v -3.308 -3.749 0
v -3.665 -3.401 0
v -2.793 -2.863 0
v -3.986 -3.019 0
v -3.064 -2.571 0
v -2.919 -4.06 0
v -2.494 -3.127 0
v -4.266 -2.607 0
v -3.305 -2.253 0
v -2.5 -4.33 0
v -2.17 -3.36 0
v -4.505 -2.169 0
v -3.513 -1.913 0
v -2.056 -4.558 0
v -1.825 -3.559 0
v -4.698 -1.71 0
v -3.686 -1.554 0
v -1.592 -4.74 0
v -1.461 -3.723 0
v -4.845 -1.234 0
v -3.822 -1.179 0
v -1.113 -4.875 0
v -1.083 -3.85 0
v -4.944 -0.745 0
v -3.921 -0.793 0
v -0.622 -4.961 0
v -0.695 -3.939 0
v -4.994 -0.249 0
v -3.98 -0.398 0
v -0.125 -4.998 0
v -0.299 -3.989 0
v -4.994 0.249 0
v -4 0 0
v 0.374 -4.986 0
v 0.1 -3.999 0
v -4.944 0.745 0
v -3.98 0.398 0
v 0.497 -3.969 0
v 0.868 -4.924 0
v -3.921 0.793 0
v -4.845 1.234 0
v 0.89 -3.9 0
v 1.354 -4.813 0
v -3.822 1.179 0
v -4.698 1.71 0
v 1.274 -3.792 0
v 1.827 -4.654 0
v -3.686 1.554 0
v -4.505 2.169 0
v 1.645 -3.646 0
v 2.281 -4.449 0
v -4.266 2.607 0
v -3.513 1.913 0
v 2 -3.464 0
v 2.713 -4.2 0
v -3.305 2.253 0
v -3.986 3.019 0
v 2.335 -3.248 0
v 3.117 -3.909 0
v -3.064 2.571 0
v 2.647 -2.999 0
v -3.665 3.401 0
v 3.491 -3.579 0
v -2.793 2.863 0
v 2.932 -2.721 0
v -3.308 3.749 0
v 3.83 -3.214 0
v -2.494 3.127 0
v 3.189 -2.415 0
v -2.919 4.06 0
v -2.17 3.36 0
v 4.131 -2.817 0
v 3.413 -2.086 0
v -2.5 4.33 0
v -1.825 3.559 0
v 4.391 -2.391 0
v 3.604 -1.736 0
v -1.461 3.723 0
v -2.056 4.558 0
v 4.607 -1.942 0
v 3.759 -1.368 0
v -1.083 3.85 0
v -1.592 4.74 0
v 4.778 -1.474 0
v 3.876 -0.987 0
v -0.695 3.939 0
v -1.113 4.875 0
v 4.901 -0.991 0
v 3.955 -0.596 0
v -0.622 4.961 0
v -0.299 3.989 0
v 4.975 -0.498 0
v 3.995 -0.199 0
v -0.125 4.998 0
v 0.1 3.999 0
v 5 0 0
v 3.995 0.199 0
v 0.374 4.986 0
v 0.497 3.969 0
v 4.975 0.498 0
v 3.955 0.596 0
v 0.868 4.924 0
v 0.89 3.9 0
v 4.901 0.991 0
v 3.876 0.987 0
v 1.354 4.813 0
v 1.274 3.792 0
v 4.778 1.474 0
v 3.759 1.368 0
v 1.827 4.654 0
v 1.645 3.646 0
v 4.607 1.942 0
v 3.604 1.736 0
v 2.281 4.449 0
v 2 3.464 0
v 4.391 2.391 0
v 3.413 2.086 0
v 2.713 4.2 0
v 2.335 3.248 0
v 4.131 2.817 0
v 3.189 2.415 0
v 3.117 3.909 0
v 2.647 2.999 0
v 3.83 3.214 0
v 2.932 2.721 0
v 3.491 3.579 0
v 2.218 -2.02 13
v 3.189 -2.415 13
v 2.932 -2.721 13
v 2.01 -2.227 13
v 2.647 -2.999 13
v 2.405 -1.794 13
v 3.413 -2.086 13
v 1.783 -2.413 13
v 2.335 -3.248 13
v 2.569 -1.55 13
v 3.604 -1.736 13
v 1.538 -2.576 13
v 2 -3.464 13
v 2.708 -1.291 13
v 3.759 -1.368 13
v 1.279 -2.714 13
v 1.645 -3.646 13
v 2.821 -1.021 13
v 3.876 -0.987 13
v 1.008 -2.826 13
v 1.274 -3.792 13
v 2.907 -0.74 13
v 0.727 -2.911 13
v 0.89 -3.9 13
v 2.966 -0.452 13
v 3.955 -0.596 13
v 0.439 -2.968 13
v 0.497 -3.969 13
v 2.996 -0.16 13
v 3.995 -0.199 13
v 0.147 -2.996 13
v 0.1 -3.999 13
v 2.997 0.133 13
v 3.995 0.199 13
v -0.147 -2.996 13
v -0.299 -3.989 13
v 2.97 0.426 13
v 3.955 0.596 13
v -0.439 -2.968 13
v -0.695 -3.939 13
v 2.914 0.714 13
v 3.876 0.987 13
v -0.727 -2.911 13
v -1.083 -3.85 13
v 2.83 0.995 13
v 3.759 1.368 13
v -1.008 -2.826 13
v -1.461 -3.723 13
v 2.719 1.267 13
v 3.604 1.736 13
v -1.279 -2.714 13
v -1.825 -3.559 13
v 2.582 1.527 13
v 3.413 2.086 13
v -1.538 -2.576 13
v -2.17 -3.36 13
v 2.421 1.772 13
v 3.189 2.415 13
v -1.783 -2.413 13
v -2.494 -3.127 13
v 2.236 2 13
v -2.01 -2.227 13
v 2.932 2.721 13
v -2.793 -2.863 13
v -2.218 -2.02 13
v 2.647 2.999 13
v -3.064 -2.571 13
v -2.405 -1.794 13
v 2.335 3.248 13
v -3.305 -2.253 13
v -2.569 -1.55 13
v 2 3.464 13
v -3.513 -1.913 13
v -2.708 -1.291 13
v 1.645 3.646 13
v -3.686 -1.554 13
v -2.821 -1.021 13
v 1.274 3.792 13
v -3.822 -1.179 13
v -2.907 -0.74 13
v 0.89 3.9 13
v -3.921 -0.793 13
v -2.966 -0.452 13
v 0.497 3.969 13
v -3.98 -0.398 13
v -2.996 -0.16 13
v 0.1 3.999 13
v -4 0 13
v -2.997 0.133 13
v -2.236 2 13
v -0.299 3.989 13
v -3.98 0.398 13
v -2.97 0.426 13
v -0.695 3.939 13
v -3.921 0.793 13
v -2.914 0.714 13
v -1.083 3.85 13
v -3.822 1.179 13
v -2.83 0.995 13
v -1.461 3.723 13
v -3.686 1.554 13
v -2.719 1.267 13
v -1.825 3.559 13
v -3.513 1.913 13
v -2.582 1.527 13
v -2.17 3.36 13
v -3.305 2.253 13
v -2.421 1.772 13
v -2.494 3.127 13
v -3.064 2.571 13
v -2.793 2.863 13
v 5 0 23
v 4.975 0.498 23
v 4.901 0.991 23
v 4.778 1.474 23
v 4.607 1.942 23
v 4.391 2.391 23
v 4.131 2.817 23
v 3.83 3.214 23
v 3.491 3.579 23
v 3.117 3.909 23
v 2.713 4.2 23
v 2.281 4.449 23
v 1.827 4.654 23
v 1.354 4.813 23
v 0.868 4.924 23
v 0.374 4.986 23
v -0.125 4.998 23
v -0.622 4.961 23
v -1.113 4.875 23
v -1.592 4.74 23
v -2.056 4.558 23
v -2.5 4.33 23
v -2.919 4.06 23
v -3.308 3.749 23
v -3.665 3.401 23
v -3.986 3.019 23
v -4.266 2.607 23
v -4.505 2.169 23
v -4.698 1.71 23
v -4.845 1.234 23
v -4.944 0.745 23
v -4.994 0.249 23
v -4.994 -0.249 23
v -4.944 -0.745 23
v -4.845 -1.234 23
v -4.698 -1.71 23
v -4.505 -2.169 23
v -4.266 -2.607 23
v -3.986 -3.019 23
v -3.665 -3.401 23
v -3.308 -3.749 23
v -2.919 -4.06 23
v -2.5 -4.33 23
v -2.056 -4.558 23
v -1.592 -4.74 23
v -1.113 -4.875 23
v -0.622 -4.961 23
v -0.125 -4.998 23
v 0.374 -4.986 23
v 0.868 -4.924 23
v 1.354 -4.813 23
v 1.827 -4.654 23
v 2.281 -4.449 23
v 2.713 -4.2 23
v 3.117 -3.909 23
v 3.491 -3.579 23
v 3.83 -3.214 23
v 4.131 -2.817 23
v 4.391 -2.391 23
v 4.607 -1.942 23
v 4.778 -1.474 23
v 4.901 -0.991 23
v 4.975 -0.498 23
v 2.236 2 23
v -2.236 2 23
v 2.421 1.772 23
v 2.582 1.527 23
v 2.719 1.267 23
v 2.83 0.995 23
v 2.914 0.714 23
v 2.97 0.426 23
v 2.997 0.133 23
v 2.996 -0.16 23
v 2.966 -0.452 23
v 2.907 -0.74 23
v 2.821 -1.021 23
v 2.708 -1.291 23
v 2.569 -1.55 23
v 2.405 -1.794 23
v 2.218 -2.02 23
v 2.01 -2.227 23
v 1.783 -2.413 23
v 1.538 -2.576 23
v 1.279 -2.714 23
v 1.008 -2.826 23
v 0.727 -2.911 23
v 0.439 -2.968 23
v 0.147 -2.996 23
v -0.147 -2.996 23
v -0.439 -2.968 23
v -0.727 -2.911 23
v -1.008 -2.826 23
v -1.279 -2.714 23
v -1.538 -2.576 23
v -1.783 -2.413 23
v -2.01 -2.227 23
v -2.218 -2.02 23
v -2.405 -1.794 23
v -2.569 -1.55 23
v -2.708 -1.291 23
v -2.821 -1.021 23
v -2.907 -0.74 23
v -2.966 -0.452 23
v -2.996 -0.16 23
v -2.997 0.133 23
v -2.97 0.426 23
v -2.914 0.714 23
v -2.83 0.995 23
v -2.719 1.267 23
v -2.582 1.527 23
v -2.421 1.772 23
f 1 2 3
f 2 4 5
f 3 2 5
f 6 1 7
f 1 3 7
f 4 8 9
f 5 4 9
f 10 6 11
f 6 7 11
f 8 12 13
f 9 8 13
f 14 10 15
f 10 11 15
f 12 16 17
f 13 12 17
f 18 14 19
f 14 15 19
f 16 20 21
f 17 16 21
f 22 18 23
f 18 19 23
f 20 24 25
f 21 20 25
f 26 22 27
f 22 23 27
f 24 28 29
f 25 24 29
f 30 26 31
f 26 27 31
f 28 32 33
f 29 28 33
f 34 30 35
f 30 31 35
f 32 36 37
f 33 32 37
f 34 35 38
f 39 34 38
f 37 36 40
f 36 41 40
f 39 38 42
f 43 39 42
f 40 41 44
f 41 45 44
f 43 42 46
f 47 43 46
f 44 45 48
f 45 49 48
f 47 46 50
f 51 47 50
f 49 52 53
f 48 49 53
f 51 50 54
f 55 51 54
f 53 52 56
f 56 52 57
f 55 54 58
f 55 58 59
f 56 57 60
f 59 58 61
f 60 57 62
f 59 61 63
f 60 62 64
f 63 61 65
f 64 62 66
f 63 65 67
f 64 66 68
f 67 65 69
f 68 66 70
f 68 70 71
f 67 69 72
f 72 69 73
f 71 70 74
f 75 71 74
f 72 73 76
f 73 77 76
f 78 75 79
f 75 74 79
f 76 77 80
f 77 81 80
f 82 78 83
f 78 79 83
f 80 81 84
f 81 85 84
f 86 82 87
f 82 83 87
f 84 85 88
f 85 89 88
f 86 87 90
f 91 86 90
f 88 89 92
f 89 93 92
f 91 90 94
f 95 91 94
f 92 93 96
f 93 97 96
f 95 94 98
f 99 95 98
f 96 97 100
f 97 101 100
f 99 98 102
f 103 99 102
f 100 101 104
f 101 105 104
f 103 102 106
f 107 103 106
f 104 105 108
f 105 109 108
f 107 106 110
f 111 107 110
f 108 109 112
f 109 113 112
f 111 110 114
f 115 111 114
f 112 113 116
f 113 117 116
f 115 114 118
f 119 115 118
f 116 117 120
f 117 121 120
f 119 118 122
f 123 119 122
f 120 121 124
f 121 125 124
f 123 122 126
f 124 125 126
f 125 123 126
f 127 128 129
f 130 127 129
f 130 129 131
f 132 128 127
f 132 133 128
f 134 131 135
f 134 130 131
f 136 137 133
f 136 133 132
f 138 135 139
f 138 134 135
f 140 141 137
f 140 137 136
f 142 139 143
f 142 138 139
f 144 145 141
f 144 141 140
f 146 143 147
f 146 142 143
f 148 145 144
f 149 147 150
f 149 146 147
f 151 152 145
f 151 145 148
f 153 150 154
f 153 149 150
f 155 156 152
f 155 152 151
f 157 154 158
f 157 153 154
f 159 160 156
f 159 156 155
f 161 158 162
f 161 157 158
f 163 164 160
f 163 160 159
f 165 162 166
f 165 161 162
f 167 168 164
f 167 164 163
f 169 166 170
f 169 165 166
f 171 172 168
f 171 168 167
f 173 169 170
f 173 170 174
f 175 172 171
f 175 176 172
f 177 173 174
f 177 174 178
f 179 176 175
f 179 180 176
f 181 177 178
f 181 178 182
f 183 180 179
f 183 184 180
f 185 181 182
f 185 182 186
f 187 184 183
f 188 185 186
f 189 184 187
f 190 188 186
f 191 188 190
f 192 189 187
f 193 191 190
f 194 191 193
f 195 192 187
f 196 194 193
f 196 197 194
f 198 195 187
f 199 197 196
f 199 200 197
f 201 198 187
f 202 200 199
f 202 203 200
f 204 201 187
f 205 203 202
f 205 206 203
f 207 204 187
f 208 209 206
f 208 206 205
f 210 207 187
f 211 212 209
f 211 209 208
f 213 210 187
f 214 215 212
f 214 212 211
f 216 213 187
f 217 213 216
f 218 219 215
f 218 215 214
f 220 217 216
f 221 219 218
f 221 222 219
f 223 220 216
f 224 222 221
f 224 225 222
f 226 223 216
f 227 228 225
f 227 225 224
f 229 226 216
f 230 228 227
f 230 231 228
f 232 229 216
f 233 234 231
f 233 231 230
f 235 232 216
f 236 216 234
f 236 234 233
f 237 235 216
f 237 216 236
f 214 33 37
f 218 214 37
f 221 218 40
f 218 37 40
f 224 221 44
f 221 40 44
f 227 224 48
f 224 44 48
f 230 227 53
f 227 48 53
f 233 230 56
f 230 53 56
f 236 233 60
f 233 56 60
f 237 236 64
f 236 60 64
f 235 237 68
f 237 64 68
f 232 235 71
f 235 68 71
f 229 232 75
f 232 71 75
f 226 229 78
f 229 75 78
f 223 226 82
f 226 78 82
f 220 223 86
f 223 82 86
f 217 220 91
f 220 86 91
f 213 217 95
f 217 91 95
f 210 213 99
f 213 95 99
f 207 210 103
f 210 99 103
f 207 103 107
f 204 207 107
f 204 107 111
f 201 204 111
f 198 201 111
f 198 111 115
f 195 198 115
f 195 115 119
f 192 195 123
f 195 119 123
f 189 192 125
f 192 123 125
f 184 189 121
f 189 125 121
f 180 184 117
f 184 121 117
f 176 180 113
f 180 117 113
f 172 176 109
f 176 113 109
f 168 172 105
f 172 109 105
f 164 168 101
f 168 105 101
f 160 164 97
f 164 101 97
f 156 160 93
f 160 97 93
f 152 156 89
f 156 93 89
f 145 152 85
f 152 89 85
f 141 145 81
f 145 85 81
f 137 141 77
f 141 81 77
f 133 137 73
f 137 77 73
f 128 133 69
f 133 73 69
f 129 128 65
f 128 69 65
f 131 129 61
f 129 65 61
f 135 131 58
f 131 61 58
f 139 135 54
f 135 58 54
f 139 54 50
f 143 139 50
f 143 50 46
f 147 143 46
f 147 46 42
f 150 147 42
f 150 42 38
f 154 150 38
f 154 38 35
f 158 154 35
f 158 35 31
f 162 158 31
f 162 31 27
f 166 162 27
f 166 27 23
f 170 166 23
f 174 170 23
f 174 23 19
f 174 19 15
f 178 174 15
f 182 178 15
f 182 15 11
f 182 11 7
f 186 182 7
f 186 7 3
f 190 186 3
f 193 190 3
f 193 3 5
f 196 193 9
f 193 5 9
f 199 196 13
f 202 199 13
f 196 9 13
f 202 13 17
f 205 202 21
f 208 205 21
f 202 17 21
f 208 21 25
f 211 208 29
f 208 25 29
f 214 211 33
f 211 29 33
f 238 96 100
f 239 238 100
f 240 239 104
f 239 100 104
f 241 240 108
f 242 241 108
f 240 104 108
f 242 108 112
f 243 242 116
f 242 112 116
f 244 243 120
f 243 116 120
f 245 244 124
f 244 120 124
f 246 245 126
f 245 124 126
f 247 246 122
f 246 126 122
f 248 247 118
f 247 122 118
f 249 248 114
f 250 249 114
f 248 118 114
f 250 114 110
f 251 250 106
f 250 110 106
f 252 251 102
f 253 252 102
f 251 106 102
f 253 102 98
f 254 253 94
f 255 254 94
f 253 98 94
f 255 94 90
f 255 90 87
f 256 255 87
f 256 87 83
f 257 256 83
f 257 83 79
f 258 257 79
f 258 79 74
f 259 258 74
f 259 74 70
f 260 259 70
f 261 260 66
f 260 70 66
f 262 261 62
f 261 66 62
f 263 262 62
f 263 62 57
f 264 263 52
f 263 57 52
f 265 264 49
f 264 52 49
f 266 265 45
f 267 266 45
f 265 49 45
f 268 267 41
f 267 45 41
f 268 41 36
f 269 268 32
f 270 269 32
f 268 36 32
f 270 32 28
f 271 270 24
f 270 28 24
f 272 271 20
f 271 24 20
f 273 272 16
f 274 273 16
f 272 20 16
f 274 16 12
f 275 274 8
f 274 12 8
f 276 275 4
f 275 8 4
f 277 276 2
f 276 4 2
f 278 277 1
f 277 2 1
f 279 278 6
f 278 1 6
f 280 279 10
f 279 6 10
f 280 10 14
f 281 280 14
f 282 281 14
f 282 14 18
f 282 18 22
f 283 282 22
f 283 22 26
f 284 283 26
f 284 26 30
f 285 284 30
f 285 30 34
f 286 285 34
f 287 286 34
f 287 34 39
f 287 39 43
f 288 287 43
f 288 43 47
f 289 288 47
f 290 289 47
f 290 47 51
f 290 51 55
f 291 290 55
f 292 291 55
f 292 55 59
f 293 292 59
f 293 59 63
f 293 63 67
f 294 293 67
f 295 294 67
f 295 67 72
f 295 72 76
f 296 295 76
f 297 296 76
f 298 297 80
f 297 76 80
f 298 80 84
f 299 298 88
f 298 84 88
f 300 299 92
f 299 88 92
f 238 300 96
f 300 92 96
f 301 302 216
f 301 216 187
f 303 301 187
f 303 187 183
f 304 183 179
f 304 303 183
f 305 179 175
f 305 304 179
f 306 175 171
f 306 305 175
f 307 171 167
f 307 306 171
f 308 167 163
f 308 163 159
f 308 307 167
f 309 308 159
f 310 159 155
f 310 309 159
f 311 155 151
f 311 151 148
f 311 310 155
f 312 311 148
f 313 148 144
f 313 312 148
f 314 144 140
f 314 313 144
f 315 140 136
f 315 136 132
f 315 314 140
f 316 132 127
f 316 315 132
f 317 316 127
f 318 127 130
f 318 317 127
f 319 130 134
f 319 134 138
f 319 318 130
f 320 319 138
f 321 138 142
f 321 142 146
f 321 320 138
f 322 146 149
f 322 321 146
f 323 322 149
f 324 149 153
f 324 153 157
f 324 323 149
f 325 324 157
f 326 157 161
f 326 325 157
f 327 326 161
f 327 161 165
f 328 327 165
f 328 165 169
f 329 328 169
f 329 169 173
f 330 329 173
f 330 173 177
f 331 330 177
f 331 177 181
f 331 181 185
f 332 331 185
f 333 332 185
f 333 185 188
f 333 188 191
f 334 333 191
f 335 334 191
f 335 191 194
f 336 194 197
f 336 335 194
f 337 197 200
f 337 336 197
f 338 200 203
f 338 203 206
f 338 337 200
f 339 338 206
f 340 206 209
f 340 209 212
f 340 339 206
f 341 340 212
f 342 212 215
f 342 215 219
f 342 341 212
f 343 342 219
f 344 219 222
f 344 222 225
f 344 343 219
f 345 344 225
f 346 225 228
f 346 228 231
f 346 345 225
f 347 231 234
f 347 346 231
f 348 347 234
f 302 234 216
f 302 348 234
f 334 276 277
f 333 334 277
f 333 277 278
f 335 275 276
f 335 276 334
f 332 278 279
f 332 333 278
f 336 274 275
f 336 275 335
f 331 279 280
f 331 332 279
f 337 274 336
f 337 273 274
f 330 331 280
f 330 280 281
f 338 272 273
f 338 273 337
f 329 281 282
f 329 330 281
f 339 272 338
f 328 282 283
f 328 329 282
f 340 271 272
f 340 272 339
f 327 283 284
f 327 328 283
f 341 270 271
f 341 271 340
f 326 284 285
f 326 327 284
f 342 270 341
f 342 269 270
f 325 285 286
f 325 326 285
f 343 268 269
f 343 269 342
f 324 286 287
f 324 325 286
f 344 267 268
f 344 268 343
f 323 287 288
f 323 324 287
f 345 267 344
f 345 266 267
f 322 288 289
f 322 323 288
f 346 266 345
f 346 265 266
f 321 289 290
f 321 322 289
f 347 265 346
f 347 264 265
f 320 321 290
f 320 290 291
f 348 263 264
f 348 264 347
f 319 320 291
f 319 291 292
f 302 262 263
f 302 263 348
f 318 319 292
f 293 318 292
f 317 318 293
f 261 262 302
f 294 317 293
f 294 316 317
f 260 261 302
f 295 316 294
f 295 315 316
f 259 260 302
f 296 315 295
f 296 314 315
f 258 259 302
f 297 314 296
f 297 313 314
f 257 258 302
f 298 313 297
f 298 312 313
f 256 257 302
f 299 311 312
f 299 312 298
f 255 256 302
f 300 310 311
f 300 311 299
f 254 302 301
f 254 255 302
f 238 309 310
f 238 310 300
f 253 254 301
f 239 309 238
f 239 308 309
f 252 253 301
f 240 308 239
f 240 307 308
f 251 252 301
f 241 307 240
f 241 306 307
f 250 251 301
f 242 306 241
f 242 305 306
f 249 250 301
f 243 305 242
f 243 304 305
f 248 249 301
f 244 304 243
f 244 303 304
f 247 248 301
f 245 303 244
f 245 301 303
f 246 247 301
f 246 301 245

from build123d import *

# Parameters (mm, degrees)
SKETCH_1_R          = 5
EXTRUDE_1_DEPTH     = 23
CUT_EXTRUDE_1_DEPTH = 10
SKETCH_3_R          = 4
CUT_EXTRUDE_2_DEPTH = 13


with BuildPart() as part:
    # 草图1 → 凸台-拉伸1 (new body)
    with BuildSketch(Plane.XY):
        Circle(SKETCH_1_R)
    extrude(amount=EXTRUDE_1_DEPTH)

    # 草图2 → 切除-拉伸1 (cut)
    with BuildSketch(Plane.XY.offset(23)):
        with BuildLine():
            Line((-2.236067977, 2), (2.236067977, 2))
            ThreePointArc((2.236067977, 2), (0, -3), (-2.236067977, 2))
        make_face()
    extrude(amount=-CUT_EXTRUDE_1_DEPTH, mode=Mode.SUBTRACT)

    # 草图3 → 切除-拉伸2 (cut)
    with BuildSketch(Plane(origin=(0, 0, 0), x_dir=(-1, 0, 0), z_dir=(0, 0, -1))):
        Circle(SKETCH_3_R)
    extrude(amount=-CUT_EXTRUDE_2_DEPTH, mode=Mode.SUBTRACT)


solid = part.part
